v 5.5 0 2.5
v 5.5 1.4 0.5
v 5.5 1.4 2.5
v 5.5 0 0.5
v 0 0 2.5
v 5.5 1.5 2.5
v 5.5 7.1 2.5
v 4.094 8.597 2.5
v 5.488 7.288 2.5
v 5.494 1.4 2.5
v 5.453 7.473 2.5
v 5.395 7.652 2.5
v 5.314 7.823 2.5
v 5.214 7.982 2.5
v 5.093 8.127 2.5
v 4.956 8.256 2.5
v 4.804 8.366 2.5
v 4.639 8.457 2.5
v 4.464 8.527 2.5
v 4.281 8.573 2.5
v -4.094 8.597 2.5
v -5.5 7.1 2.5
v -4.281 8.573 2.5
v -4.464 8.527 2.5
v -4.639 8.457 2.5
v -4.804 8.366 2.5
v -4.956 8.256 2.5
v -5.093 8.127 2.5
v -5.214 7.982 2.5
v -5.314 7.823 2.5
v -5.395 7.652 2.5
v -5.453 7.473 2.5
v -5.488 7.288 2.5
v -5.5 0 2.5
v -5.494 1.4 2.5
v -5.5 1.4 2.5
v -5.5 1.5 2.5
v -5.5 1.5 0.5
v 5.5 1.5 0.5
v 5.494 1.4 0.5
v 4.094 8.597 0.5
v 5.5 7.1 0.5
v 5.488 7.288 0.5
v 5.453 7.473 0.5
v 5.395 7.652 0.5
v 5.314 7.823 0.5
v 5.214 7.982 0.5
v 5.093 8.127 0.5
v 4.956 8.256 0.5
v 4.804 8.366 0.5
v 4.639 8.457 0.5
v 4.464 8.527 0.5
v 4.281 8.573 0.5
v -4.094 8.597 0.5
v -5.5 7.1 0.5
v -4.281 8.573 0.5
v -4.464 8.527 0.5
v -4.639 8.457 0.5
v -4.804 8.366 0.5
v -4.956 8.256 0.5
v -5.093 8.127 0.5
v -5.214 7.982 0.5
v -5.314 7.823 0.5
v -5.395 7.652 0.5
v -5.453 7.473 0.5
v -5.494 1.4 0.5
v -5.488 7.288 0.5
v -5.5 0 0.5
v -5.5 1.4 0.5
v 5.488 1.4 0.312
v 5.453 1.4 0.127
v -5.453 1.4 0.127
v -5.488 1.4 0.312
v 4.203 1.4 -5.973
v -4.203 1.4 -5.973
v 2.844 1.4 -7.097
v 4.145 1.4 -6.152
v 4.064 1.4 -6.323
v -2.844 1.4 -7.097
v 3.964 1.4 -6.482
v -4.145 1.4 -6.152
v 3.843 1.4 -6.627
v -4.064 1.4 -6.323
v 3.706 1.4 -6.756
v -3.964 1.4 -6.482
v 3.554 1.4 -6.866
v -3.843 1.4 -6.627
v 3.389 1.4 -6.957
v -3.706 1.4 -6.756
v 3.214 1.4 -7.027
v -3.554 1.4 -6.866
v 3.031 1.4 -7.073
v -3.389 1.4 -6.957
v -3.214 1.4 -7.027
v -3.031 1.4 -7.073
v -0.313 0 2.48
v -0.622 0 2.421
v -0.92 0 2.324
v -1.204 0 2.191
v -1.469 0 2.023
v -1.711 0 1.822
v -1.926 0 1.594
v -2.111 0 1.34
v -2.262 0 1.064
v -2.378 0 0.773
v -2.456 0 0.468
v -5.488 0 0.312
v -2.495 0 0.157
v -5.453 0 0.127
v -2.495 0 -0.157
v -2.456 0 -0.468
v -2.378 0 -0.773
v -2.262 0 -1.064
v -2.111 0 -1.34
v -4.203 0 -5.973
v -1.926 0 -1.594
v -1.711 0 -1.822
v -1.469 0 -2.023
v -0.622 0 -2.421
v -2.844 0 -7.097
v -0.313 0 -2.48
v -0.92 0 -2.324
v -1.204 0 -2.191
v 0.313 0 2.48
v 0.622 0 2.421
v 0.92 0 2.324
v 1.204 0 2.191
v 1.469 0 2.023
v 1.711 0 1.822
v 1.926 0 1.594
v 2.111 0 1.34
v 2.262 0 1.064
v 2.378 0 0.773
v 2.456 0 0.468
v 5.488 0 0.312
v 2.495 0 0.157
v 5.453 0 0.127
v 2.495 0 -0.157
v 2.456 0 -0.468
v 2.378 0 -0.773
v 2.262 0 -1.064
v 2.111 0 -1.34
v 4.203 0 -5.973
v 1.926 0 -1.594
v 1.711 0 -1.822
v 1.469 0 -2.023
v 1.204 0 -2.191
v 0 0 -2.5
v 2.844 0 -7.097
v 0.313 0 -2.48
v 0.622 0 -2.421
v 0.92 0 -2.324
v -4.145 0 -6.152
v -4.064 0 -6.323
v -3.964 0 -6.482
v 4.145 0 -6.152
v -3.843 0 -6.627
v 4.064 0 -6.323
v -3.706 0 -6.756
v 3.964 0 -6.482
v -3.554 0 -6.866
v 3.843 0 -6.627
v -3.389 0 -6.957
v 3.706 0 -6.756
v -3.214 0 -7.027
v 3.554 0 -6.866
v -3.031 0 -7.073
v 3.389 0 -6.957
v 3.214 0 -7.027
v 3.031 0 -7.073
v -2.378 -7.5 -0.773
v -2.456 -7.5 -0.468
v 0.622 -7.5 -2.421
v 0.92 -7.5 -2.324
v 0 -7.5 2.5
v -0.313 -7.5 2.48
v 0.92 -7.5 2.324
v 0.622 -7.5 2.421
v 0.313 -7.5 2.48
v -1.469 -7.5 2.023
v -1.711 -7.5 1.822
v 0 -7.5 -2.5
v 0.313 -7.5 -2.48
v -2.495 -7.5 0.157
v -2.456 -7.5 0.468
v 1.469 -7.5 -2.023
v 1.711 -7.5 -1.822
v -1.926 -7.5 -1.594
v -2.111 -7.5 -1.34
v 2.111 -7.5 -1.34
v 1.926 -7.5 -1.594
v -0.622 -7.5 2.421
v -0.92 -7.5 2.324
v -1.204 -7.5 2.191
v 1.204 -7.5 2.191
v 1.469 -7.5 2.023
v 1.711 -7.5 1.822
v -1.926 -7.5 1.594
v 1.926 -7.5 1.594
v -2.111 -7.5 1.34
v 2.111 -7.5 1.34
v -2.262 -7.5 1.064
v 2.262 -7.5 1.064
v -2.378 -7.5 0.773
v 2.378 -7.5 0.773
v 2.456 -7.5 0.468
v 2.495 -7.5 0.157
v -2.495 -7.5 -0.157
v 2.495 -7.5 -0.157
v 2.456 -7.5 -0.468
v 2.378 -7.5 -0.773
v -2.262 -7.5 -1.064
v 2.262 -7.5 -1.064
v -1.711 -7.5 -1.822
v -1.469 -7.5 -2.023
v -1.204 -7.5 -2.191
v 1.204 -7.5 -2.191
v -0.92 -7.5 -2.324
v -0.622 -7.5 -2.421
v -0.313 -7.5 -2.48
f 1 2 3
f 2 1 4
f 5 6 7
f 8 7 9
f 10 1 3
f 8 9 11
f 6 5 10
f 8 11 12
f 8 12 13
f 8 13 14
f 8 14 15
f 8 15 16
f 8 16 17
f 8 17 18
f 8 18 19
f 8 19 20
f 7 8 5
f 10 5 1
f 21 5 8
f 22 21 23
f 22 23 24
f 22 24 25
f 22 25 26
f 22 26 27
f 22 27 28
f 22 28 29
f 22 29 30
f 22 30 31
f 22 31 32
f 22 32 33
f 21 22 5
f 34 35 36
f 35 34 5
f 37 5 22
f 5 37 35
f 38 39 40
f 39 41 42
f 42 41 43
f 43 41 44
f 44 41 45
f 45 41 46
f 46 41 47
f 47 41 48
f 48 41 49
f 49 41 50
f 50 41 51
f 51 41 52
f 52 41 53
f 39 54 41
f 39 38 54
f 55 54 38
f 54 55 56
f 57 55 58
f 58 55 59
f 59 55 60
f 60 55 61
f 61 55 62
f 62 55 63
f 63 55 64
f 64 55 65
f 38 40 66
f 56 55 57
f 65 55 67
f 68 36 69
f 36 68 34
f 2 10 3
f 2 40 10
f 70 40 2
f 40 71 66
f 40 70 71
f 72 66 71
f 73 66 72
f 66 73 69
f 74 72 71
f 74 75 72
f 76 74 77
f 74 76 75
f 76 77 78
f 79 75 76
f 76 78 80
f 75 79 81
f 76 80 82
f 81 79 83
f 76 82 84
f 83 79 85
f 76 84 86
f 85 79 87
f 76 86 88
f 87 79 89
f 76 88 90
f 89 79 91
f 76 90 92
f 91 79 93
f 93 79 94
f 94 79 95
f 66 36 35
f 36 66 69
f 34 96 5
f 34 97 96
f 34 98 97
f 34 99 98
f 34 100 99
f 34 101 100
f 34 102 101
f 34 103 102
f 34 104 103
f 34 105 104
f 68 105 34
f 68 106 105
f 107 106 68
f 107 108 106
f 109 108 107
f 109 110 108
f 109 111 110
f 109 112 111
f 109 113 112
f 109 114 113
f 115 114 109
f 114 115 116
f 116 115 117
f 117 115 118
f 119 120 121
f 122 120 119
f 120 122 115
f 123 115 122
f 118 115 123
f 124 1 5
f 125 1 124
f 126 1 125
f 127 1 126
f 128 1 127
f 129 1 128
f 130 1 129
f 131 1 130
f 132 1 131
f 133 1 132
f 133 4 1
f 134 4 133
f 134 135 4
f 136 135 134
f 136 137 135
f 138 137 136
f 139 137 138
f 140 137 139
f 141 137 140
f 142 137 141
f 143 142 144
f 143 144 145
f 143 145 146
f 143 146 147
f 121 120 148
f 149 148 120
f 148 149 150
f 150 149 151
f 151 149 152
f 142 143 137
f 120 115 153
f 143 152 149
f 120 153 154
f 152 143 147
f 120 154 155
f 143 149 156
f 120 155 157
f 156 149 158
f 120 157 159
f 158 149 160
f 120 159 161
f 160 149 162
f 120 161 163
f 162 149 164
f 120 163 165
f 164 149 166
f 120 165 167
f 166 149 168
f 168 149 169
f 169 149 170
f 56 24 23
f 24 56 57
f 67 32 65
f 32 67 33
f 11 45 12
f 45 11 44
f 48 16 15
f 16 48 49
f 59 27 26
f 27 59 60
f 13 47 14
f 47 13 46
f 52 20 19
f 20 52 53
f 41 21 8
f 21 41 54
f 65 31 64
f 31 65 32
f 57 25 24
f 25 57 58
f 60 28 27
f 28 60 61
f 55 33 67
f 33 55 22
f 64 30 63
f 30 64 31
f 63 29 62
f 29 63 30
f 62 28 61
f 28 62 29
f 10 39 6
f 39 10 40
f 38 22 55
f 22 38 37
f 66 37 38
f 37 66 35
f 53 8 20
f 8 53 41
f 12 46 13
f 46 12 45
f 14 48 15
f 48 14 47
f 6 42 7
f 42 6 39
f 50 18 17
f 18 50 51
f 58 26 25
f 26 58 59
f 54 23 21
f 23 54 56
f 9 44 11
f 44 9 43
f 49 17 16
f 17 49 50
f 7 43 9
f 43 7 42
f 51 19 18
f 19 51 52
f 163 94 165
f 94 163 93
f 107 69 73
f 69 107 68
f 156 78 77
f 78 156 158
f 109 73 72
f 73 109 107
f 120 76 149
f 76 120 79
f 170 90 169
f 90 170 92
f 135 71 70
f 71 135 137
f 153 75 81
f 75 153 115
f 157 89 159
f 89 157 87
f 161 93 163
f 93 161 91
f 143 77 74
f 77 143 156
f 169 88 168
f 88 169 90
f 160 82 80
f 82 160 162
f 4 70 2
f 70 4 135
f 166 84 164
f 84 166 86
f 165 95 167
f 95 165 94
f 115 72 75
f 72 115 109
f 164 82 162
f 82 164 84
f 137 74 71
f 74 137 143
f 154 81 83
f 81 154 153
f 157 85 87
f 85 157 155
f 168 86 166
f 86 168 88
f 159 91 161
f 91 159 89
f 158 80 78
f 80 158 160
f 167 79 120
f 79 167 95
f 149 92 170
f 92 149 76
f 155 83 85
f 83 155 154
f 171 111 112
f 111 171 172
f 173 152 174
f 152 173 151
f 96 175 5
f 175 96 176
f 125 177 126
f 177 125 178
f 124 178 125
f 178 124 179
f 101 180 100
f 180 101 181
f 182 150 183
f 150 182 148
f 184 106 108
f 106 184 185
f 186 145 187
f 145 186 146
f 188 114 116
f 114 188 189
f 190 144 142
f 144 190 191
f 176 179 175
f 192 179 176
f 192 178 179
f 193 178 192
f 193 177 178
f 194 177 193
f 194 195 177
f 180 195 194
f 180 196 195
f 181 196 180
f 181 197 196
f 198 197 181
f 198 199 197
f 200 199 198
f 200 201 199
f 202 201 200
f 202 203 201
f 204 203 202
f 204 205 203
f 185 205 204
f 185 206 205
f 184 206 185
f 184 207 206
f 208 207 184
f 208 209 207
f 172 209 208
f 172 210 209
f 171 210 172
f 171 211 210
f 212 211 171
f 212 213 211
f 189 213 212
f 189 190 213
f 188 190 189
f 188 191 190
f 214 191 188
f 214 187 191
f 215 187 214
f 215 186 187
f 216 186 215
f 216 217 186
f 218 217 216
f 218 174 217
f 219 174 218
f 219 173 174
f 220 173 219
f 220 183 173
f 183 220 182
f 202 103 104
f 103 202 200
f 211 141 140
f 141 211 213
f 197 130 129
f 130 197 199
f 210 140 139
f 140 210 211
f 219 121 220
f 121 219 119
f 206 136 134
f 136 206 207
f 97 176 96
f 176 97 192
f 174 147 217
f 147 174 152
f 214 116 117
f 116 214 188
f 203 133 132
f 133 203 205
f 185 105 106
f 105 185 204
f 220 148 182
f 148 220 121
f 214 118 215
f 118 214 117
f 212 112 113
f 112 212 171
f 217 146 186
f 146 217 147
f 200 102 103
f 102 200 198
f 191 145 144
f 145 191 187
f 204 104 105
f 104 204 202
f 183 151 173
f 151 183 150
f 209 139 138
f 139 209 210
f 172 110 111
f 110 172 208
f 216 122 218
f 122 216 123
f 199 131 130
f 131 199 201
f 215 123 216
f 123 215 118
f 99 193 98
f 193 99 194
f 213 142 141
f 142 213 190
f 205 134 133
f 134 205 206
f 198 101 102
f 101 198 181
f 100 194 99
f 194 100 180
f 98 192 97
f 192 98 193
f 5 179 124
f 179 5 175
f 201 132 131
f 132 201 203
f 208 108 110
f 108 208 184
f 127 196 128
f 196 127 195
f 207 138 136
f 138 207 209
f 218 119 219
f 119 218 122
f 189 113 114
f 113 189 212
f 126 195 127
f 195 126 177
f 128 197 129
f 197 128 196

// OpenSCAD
// Detail level
$fn = 50;

pin_depth = 7.5;
pin_diameter = 5;

support_thickness_upper = 2;
support_thickness_lower = 1.4;
support_thickness_taper_upper = 0;

support_depth = 11;
support_depth_lower = 8.5;

support_length_upper = 8.6;
support_length_lower = 9.6;
edge_radius = 1.5;

union() {
    rotate([0, 90, -90]) {
        cylinder(r=(pin_diameter/2), h=pin_depth);
    }
    translate([-support_depth/2, 0, pin_diameter/2 - support_thickness_upper]) {
        union() {
            cube([support_depth, support_thickness_lower, support_thickness_upper]);
            hull() {
                    translate([edge_radius, edge_radius, 0]) {
                        cylinder(r=(edge_radius), h=support_thickness_upper);
                    };
                    translate([support_depth - edge_radius, edge_radius, 0]) {
                        cylinder(r=(edge_radius), h=support_thickness_upper);
                    };
                    translate([edge_radius, support_length_upper - edge_radius, support_thickness_taper_upper]) {
                        cylinder(r=(edge_radius), h=support_thickness_upper - support_thickness_taper_upper);
                    };
                    translate([support_depth - edge_radius, support_length_upper - edge_radius, support_thickness_taper_upper]) {
                        cylinder(r=(edge_radius), h=support_thickness_upper - support_thickness_taper_upper);
                    };
                }
            rotate([-90, 0, 0]) {
                hull() {
                    translate([edge_radius, 0, 0]) {
                        cylinder(r=(edge_radius), h=support_thickness_lower);
                    };
                    translate([support_depth - edge_radius, 0, 0]) {
                        cylinder(r=(edge_radius), h=support_thickness_lower);
                    };
                    translate([edge_radius + ((support_depth - support_depth_lower) / 2), support_length_lower - edge_radius - support_thickness_upper, 0]) {
                        cylinder(r=(edge_radius), h=support_thickness_lower);
                    };
                    translate([support_depth_lower + ((support_depth - support_depth_lower) / 2) - edge_radius, support_length_lower - edge_radius - support_thickness_upper, 0]) {
                        cylinder(r=(edge_radius), h=support_thickness_lower);
                    };
                }
            }
        }
    }
}
